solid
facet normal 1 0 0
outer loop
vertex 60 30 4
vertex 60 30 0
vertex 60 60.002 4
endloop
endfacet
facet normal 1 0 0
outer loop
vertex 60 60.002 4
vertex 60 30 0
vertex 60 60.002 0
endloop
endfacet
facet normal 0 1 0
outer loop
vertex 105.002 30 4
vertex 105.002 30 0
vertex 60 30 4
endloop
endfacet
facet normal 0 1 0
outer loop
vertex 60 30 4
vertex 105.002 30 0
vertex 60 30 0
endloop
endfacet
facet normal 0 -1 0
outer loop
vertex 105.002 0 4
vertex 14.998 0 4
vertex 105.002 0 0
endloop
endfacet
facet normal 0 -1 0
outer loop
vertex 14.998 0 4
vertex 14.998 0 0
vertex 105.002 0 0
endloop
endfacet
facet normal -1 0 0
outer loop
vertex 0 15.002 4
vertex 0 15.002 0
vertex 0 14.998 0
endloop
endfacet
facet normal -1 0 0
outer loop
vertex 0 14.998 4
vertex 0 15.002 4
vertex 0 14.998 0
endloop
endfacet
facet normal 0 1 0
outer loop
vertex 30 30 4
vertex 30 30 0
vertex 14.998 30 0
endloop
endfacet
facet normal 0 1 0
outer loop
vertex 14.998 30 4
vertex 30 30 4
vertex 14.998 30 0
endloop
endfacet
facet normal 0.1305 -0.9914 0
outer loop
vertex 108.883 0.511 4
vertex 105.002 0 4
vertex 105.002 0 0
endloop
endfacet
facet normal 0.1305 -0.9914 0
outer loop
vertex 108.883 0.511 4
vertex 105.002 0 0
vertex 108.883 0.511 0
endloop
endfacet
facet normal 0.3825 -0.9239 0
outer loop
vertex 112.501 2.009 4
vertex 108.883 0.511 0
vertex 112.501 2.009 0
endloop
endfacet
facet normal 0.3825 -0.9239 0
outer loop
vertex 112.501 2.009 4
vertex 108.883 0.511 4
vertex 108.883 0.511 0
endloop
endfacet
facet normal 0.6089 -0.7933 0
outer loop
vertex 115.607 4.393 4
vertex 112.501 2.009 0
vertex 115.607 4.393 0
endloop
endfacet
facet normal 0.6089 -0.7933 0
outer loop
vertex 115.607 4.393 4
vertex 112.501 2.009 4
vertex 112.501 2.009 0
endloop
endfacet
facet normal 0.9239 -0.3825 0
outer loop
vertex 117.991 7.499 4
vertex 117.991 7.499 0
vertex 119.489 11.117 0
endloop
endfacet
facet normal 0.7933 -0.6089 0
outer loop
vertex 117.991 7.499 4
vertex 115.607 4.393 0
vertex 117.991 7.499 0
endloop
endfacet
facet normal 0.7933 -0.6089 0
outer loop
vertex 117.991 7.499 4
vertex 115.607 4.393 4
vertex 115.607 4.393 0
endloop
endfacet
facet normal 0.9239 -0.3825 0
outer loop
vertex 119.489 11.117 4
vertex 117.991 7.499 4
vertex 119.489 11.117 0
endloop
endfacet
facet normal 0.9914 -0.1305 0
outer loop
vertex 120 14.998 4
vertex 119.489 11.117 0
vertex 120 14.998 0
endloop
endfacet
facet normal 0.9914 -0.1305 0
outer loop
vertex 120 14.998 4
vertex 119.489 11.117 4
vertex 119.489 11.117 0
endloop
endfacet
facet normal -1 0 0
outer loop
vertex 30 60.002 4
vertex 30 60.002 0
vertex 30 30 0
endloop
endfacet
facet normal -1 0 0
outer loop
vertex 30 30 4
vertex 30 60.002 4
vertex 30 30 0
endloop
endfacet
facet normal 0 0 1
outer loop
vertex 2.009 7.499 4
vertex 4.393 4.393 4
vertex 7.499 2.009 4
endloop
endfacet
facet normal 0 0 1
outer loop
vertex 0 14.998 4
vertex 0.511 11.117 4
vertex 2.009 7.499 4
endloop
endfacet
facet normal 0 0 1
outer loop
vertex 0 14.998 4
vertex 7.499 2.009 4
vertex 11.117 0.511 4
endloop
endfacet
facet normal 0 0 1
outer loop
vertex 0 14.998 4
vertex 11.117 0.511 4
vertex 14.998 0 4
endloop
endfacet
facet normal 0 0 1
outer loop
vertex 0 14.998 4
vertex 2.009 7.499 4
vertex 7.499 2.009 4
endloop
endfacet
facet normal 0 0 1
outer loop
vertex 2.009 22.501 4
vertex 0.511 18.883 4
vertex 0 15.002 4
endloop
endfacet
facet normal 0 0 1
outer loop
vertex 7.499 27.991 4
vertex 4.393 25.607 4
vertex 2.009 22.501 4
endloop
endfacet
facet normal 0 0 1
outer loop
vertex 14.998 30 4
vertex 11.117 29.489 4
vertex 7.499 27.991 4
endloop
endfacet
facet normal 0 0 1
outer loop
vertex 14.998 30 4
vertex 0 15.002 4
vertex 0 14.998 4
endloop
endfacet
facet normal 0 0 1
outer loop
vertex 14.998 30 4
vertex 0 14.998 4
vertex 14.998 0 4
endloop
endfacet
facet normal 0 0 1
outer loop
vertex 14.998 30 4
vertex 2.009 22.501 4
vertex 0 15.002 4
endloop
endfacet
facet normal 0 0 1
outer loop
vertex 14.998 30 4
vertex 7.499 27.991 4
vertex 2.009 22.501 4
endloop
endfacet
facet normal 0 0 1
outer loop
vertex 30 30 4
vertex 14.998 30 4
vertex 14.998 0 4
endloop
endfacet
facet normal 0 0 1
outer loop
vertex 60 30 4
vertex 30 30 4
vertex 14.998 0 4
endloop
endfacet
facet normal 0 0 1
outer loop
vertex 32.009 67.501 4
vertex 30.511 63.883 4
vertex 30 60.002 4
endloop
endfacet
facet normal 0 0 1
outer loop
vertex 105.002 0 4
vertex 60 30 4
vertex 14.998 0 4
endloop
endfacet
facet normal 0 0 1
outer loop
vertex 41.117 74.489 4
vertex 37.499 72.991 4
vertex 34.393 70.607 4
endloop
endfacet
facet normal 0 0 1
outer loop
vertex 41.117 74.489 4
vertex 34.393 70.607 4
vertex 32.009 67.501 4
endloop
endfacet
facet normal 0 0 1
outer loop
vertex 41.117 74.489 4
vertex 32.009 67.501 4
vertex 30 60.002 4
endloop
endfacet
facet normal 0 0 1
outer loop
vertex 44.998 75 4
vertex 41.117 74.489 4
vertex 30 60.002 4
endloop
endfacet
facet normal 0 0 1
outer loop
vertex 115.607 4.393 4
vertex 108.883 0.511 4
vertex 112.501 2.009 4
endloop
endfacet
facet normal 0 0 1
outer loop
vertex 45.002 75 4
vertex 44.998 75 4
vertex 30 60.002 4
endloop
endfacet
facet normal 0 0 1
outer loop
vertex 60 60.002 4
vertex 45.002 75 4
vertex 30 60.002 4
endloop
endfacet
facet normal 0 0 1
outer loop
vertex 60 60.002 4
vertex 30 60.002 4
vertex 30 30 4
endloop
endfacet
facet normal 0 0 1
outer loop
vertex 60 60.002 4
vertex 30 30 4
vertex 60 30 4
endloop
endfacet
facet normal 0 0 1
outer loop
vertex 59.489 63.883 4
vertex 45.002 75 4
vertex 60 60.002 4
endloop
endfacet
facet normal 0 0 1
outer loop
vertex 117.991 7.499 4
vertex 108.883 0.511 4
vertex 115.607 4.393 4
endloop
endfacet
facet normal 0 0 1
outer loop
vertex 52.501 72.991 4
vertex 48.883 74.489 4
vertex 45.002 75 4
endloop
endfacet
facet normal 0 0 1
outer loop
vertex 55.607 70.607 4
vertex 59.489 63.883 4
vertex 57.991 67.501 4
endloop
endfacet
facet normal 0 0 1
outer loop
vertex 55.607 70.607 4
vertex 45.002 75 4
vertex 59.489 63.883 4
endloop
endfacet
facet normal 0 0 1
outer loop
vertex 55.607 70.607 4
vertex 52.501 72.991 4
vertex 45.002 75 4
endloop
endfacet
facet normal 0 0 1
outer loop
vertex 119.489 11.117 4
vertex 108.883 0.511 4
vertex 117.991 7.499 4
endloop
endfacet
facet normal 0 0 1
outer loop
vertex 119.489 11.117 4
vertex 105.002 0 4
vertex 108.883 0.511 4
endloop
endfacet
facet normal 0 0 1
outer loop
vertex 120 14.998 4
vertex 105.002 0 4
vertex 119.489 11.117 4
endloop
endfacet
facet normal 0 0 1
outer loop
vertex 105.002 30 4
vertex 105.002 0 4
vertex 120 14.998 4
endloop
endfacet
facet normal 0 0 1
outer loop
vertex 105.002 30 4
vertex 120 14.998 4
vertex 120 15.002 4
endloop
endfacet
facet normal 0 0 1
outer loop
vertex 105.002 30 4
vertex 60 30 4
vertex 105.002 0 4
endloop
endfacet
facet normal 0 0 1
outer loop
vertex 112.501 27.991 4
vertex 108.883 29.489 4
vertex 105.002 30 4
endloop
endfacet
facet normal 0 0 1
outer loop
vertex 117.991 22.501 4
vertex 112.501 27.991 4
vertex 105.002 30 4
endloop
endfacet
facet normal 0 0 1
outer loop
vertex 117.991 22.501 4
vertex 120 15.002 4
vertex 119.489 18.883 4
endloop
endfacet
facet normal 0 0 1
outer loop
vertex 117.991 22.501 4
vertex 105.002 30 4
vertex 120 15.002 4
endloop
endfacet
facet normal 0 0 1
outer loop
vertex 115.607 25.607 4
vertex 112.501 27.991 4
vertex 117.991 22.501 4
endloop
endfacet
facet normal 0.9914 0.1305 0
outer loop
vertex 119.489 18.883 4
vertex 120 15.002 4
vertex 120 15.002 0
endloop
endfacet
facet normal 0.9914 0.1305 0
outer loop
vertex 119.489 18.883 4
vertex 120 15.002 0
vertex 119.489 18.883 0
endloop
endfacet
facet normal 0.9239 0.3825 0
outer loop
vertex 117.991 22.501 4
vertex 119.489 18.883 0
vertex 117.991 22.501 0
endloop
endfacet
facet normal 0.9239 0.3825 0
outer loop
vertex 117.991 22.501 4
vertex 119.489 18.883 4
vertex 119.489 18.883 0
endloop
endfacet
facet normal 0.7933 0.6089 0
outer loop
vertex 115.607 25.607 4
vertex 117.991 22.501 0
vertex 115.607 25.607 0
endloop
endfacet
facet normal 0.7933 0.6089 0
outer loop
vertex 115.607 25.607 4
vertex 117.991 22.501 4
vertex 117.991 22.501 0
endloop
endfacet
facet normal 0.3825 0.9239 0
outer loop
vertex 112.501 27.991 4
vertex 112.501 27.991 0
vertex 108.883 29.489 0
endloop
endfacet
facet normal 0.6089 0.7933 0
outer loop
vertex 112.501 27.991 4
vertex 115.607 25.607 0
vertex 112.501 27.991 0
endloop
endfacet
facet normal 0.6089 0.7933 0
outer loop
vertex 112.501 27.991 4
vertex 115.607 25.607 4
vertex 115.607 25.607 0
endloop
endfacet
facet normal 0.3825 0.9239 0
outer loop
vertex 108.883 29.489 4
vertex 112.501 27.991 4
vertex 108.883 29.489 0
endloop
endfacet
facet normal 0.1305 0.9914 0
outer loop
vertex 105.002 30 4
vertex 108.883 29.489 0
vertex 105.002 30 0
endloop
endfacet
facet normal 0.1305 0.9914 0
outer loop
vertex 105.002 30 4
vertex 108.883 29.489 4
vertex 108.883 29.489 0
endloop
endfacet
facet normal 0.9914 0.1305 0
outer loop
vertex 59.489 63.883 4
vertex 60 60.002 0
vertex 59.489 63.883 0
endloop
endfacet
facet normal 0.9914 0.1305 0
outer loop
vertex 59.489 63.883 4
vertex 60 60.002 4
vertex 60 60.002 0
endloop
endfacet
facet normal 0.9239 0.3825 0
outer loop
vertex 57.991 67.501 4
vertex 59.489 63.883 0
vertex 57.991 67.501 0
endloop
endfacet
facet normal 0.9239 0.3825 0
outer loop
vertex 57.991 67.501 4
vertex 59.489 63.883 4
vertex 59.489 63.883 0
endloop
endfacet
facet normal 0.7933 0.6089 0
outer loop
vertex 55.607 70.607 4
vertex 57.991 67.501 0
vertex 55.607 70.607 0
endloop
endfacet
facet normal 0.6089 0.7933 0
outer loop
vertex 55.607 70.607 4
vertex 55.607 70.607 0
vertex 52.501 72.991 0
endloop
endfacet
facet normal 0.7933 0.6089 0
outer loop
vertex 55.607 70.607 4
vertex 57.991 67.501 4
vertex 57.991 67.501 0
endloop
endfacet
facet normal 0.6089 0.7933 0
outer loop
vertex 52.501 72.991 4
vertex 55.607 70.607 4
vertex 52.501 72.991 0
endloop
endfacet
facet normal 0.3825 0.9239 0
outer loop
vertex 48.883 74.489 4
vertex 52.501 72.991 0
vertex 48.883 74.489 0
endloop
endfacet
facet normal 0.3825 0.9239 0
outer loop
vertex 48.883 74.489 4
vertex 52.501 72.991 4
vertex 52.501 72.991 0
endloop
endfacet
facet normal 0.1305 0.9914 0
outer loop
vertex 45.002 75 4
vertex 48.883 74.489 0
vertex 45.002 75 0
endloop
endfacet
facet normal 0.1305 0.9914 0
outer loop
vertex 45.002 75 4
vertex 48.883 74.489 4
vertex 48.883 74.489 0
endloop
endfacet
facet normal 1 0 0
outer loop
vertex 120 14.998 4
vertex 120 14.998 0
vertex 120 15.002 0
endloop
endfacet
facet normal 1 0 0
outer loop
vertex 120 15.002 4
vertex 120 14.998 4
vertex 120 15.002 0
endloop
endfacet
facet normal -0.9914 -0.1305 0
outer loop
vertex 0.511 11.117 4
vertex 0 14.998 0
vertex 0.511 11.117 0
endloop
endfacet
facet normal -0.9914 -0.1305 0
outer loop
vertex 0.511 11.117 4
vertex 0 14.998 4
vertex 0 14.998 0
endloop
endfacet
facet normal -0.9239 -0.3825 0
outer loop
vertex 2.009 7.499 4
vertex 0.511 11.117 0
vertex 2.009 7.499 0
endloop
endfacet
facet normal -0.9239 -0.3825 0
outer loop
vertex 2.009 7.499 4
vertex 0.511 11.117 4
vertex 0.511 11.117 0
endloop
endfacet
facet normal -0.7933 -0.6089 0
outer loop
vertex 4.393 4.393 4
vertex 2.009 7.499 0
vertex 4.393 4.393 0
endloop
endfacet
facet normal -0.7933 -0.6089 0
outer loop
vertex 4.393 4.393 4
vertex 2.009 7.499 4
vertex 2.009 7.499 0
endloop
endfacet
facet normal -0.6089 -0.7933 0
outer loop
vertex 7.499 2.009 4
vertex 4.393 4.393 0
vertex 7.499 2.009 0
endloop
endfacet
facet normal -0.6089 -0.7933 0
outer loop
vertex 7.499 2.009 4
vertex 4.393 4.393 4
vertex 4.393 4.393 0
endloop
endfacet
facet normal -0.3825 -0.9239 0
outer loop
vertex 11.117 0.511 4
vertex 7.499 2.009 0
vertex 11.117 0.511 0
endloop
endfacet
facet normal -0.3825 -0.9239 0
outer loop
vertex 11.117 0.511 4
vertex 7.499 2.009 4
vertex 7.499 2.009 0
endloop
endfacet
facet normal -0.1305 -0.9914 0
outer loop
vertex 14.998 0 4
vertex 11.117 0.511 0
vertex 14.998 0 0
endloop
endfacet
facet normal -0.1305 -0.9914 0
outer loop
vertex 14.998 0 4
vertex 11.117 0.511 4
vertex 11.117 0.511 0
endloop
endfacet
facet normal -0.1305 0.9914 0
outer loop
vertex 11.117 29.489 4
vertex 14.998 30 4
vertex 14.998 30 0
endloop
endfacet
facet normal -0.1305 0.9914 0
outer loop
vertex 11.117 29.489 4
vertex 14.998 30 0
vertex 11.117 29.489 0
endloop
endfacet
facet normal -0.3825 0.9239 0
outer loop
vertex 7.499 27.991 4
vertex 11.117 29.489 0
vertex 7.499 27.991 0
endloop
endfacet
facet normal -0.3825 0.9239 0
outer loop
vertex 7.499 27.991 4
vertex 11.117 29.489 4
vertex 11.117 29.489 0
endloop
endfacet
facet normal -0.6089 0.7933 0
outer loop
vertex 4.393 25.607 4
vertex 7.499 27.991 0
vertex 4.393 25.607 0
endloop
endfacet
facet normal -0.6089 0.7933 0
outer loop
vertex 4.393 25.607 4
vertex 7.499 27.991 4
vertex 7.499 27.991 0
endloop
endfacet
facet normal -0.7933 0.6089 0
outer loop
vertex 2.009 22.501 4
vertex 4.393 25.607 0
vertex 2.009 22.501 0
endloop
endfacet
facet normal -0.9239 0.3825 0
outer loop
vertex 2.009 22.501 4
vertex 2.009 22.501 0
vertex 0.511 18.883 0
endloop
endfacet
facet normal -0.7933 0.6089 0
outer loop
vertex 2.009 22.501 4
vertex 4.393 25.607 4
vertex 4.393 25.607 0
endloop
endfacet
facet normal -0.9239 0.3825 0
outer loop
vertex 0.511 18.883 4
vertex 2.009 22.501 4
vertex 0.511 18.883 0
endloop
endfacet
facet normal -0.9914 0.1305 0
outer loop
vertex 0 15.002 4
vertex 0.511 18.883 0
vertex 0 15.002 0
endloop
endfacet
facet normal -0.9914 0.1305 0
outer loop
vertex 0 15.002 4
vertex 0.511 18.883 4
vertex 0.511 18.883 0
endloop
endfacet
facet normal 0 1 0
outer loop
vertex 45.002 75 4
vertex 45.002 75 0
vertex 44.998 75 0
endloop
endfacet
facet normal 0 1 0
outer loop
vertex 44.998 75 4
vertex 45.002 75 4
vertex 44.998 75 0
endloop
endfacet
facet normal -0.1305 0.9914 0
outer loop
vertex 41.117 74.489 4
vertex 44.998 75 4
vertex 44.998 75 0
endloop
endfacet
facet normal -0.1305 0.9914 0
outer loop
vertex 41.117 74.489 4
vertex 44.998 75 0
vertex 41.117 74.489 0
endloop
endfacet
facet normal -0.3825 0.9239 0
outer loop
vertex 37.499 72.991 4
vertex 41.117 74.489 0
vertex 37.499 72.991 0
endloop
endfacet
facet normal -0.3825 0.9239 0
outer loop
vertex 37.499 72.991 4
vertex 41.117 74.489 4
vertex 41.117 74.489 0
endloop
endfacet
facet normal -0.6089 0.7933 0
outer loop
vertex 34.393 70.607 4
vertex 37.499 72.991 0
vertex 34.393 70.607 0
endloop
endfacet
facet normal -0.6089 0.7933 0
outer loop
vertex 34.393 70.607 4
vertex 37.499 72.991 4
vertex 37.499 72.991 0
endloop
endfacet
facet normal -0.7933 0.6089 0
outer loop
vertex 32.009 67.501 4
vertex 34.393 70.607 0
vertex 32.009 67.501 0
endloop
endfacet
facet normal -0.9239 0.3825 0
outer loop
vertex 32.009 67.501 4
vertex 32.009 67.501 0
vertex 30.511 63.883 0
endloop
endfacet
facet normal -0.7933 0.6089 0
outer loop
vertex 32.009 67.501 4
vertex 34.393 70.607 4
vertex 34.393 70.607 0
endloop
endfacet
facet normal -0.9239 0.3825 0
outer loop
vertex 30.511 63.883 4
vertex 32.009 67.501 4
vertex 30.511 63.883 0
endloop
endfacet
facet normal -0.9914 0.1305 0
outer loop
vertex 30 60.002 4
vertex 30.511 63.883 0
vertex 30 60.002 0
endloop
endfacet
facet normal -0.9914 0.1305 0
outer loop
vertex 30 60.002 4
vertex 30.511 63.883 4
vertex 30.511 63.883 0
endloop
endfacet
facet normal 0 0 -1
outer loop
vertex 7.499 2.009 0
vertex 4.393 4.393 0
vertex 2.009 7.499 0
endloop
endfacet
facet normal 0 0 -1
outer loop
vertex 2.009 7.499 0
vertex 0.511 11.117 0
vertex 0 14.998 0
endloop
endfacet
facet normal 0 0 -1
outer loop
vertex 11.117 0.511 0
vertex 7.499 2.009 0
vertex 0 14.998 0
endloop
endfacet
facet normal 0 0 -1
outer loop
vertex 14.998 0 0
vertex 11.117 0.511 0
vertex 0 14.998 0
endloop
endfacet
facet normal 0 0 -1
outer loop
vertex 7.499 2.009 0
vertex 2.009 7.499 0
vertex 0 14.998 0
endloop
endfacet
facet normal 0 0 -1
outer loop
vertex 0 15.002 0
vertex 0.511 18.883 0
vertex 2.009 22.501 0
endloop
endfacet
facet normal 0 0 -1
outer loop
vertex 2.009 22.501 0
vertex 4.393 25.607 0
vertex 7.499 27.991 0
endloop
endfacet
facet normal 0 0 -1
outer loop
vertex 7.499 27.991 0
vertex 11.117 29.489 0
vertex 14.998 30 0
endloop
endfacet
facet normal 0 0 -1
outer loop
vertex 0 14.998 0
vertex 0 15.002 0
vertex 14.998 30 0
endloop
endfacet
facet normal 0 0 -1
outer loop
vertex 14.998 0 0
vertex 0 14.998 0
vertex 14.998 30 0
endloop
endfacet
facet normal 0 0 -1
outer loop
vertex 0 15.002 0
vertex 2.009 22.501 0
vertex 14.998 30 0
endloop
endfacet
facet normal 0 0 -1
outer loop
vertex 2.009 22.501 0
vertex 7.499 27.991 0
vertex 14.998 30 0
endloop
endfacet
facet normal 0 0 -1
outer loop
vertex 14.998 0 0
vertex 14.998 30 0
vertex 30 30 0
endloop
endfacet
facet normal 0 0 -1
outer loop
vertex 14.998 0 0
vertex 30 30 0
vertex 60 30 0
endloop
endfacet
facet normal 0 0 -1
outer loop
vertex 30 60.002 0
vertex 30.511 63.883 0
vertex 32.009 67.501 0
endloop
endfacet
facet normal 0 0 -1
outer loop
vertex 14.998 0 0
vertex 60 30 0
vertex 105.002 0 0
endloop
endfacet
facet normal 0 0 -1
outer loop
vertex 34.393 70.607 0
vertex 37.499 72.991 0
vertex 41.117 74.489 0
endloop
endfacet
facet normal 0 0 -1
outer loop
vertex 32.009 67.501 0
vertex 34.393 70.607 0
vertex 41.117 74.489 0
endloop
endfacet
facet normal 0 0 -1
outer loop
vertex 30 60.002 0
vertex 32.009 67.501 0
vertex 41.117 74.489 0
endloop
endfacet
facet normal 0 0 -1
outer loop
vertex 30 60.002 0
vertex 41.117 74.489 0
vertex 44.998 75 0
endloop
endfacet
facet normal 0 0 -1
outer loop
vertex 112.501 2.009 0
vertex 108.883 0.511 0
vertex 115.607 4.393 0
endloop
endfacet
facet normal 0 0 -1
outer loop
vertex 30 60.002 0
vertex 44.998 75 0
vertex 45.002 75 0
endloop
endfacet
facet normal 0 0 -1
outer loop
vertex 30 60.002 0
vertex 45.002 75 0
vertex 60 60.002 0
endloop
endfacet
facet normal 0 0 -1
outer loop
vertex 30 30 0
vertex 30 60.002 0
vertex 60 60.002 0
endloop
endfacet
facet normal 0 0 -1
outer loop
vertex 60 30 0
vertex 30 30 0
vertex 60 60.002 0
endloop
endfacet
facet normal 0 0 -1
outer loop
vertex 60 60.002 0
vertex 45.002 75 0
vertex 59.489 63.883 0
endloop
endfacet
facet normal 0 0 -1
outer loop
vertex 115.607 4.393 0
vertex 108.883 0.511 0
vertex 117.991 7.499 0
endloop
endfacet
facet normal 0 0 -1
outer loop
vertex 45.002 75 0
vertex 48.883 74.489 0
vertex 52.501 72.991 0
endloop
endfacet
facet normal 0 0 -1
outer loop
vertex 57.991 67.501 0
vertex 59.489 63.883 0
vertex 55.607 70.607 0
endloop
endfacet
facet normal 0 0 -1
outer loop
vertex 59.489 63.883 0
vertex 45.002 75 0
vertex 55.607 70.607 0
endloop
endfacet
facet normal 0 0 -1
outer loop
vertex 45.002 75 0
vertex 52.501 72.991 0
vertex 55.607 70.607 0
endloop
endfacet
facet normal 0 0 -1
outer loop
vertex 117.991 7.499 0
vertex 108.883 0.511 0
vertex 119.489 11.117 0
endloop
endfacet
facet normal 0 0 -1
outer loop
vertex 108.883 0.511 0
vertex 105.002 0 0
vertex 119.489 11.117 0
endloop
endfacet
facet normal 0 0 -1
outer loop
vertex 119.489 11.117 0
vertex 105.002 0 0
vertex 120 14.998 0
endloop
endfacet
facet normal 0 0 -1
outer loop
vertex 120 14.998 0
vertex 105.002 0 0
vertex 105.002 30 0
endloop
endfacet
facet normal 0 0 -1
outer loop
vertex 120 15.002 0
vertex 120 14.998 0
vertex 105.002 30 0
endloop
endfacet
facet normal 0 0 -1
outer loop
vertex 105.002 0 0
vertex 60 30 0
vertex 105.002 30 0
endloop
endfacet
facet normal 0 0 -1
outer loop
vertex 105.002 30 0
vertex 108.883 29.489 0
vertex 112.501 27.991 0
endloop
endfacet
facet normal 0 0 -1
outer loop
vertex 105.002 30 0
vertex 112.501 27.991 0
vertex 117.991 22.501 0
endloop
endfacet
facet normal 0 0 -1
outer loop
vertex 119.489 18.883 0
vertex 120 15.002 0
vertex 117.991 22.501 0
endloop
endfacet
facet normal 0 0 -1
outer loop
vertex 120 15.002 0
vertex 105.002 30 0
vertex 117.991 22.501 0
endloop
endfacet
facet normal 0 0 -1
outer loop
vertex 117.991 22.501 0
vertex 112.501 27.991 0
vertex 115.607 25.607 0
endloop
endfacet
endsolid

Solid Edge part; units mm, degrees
sketch "Sketch1" plane through (0, 0, 0) normal (0, 0, 1) x (1, 0, 0)
  line L0 (30, 75) -> (30, 30)
  line L1 (30, 30) -> (60, 30)
  line L2 (60, 30) -> (60, 75)
  line L3 (60, 75) -> (30, 75)
  line L4 (120, 30) -> (0, 30)
  line L5 (0, 30) -> (0, 0)
  line L6 (0, 0) -> (120, 0)
  line L7 (120, 0) -> (120, 30)
  dimension "D1" = 30
  dimension "D2" = 30
  dimension "D3" = 30
  dimension "D4" = 120
extrude "Protrusion1" add sketch "Sketch1" along normal blind 4
fillet "RoundMain" radius 15 6 edges at (0, 30, 2) (30, 75, 2) (60, 75, 2) (120, 30, 2) (120, 0, 2) (0, 0, 2)
